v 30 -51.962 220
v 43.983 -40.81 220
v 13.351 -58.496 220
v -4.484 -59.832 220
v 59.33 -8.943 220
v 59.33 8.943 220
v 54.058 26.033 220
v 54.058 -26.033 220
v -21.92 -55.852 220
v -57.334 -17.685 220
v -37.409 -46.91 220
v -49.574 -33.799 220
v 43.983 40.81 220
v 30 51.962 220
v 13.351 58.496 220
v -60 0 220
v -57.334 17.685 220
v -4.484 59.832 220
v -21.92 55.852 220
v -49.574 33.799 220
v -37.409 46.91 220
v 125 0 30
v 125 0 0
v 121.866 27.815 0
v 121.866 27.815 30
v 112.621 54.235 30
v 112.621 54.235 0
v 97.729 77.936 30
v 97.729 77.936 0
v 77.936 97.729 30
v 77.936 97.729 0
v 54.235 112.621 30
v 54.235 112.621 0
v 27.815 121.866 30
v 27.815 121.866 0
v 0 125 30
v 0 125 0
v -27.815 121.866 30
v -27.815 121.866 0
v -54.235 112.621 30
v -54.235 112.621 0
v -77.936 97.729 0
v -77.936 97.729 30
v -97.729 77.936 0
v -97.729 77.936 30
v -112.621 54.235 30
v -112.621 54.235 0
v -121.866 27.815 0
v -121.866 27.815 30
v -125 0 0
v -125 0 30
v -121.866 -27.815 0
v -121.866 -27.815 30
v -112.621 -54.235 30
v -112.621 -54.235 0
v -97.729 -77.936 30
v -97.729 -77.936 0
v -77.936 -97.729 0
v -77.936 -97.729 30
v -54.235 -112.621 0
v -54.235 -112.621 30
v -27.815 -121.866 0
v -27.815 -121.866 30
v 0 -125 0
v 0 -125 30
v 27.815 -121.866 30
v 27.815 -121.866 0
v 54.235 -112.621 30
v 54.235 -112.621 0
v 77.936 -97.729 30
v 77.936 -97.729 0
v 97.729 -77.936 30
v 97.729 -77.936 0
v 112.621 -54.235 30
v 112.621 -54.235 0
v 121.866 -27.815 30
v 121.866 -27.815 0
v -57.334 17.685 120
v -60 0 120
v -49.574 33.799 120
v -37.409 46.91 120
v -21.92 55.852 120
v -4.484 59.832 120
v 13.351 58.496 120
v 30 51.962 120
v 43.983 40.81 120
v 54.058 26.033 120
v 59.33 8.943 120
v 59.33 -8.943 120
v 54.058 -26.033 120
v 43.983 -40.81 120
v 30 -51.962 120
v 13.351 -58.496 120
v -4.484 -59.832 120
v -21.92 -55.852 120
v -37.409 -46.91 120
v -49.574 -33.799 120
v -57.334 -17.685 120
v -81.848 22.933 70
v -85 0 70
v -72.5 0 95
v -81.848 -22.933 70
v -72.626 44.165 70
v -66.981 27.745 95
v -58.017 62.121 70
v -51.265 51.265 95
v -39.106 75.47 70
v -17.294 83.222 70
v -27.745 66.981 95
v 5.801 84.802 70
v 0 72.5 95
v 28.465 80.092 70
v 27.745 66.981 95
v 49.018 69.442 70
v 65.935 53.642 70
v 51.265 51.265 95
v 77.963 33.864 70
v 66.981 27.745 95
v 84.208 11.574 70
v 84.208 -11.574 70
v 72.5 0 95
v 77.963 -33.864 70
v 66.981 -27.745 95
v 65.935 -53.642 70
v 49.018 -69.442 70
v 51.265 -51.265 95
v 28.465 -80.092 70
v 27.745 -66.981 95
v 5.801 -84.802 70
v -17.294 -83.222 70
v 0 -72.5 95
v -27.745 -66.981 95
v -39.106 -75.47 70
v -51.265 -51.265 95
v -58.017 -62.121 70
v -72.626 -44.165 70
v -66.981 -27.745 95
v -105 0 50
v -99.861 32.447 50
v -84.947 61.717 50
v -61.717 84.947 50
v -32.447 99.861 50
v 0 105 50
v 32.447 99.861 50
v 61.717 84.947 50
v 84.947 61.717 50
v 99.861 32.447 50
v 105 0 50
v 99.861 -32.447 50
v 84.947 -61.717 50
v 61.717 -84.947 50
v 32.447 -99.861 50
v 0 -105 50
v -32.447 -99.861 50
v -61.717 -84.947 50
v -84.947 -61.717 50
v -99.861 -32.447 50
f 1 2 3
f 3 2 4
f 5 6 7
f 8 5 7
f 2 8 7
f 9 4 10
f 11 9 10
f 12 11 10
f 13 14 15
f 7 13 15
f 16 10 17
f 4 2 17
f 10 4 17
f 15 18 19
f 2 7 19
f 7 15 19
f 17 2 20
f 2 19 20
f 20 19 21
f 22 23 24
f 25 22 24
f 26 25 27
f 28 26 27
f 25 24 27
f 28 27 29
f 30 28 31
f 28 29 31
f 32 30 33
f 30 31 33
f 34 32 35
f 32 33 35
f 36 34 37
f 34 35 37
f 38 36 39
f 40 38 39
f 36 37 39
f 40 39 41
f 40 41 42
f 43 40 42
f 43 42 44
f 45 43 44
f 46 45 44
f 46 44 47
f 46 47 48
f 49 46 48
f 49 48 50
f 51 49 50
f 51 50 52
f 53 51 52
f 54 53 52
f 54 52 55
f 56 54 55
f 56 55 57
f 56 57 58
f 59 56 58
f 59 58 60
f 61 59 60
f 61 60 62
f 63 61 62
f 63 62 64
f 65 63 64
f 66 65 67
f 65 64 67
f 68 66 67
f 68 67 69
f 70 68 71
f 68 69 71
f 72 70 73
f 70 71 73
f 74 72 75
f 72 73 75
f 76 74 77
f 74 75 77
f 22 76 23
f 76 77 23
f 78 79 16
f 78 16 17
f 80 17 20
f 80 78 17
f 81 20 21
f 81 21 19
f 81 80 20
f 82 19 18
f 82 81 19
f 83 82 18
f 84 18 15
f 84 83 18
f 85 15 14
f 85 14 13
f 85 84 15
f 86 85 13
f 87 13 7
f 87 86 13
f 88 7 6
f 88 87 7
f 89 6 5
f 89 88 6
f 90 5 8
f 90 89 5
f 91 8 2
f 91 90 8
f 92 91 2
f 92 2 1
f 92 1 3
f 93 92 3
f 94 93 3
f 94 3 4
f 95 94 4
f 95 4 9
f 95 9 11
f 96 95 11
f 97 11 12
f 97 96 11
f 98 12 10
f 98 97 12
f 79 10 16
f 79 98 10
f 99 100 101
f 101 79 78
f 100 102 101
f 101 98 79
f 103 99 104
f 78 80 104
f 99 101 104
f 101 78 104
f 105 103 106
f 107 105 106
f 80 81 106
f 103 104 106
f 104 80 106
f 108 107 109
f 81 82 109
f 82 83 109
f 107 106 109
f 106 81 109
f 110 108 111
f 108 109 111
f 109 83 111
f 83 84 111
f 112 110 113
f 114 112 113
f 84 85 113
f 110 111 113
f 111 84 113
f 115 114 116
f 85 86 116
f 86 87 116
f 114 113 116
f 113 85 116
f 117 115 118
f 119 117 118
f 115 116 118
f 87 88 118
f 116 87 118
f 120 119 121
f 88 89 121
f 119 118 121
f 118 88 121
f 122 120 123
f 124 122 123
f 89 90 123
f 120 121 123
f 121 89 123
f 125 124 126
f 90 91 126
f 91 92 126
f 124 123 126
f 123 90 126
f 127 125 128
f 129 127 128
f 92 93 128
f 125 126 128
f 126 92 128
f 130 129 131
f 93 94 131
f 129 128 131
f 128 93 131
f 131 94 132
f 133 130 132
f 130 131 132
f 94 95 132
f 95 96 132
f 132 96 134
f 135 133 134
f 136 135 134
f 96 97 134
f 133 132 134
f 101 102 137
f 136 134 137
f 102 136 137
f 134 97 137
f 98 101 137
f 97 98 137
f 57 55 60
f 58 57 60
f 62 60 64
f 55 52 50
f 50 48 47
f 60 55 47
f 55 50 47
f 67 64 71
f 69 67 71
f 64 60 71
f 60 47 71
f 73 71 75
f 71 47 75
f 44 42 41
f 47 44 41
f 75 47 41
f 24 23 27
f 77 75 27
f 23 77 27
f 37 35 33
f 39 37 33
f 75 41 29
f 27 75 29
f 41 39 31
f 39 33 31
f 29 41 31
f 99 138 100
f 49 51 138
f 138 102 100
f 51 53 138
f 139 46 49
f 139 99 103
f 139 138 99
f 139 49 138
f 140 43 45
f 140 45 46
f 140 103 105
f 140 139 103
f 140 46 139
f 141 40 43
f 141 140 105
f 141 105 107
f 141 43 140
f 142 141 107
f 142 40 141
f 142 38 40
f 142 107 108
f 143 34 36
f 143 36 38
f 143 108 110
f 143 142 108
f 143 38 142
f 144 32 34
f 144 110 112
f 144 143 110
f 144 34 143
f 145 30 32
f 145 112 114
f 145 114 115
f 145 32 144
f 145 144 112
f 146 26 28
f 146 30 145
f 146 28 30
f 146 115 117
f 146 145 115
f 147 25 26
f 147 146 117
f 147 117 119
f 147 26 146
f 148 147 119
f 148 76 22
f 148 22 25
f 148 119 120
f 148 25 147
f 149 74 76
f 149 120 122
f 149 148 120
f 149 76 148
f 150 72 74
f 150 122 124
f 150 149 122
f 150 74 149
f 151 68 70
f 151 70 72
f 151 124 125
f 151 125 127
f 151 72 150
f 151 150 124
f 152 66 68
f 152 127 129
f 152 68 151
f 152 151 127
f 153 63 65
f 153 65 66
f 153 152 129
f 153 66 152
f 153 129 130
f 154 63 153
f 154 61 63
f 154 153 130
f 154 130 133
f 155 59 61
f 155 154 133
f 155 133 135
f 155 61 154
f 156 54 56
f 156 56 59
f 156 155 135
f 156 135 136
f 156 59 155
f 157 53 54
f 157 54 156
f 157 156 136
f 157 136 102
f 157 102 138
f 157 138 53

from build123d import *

# Parameters (mm, degrees)
SKETCH_1_R      = 125
EXTRUDE_1_DEPTH = 30
SKETCH_4_R      = 60
EXTRUDE_2_DEPTH = 100
SKETCH_3_R      = 85


with BuildPart() as part:
    # ｽｹｯﾁ1 → ﾎﾞｽ - 押し出し1 (new body)
    with BuildSketch(Plane.XY):
        Circle(SKETCH_1_R)
    extrude(amount=EXTRUDE_1_DEPTH)

    # ｽｹｯﾁ3 → section 0 of loft_1
    with BuildSketch(Plane(origin=(0, 0, 70), x_dir=(-1, 0, 0), z_dir=(0, 0, -1)), mode=Mode.PRIVATE) as loft_1_s0:
        Circle(SKETCH_3_R)
    # loft up to a face of the part (loft_1)
    loft([loft_1_s0.sketch, Face(Wire([part.edges().sort_by_distance((-85.568388241, 91.121078428, 30))[0]]))])



with BuildPart() as body_2:
    # ｽｹｯﾁ4 → ﾎﾞｽ - 押し出し2 (new body)
    with BuildSketch(Plane(origin=(0, 0, 120), x_dir=(-1, 0, 0), z_dir=(0, 0, -1))):
        Circle(SKETCH_4_R)
    extrude(amount=-EXTRUDE_2_DEPTH)


with BuildPart() as part_1:
    add(part.part)

    add(body_2.part)  # loft_2 joins it to this body
    # loft from a face of the part (loft_2)
    loft([part_1.faces().sort_by_distance((0, 0, 70))[0], part_1.faces().sort_by_distance((0, 0, 120))[0]])


solid = part_1.part
